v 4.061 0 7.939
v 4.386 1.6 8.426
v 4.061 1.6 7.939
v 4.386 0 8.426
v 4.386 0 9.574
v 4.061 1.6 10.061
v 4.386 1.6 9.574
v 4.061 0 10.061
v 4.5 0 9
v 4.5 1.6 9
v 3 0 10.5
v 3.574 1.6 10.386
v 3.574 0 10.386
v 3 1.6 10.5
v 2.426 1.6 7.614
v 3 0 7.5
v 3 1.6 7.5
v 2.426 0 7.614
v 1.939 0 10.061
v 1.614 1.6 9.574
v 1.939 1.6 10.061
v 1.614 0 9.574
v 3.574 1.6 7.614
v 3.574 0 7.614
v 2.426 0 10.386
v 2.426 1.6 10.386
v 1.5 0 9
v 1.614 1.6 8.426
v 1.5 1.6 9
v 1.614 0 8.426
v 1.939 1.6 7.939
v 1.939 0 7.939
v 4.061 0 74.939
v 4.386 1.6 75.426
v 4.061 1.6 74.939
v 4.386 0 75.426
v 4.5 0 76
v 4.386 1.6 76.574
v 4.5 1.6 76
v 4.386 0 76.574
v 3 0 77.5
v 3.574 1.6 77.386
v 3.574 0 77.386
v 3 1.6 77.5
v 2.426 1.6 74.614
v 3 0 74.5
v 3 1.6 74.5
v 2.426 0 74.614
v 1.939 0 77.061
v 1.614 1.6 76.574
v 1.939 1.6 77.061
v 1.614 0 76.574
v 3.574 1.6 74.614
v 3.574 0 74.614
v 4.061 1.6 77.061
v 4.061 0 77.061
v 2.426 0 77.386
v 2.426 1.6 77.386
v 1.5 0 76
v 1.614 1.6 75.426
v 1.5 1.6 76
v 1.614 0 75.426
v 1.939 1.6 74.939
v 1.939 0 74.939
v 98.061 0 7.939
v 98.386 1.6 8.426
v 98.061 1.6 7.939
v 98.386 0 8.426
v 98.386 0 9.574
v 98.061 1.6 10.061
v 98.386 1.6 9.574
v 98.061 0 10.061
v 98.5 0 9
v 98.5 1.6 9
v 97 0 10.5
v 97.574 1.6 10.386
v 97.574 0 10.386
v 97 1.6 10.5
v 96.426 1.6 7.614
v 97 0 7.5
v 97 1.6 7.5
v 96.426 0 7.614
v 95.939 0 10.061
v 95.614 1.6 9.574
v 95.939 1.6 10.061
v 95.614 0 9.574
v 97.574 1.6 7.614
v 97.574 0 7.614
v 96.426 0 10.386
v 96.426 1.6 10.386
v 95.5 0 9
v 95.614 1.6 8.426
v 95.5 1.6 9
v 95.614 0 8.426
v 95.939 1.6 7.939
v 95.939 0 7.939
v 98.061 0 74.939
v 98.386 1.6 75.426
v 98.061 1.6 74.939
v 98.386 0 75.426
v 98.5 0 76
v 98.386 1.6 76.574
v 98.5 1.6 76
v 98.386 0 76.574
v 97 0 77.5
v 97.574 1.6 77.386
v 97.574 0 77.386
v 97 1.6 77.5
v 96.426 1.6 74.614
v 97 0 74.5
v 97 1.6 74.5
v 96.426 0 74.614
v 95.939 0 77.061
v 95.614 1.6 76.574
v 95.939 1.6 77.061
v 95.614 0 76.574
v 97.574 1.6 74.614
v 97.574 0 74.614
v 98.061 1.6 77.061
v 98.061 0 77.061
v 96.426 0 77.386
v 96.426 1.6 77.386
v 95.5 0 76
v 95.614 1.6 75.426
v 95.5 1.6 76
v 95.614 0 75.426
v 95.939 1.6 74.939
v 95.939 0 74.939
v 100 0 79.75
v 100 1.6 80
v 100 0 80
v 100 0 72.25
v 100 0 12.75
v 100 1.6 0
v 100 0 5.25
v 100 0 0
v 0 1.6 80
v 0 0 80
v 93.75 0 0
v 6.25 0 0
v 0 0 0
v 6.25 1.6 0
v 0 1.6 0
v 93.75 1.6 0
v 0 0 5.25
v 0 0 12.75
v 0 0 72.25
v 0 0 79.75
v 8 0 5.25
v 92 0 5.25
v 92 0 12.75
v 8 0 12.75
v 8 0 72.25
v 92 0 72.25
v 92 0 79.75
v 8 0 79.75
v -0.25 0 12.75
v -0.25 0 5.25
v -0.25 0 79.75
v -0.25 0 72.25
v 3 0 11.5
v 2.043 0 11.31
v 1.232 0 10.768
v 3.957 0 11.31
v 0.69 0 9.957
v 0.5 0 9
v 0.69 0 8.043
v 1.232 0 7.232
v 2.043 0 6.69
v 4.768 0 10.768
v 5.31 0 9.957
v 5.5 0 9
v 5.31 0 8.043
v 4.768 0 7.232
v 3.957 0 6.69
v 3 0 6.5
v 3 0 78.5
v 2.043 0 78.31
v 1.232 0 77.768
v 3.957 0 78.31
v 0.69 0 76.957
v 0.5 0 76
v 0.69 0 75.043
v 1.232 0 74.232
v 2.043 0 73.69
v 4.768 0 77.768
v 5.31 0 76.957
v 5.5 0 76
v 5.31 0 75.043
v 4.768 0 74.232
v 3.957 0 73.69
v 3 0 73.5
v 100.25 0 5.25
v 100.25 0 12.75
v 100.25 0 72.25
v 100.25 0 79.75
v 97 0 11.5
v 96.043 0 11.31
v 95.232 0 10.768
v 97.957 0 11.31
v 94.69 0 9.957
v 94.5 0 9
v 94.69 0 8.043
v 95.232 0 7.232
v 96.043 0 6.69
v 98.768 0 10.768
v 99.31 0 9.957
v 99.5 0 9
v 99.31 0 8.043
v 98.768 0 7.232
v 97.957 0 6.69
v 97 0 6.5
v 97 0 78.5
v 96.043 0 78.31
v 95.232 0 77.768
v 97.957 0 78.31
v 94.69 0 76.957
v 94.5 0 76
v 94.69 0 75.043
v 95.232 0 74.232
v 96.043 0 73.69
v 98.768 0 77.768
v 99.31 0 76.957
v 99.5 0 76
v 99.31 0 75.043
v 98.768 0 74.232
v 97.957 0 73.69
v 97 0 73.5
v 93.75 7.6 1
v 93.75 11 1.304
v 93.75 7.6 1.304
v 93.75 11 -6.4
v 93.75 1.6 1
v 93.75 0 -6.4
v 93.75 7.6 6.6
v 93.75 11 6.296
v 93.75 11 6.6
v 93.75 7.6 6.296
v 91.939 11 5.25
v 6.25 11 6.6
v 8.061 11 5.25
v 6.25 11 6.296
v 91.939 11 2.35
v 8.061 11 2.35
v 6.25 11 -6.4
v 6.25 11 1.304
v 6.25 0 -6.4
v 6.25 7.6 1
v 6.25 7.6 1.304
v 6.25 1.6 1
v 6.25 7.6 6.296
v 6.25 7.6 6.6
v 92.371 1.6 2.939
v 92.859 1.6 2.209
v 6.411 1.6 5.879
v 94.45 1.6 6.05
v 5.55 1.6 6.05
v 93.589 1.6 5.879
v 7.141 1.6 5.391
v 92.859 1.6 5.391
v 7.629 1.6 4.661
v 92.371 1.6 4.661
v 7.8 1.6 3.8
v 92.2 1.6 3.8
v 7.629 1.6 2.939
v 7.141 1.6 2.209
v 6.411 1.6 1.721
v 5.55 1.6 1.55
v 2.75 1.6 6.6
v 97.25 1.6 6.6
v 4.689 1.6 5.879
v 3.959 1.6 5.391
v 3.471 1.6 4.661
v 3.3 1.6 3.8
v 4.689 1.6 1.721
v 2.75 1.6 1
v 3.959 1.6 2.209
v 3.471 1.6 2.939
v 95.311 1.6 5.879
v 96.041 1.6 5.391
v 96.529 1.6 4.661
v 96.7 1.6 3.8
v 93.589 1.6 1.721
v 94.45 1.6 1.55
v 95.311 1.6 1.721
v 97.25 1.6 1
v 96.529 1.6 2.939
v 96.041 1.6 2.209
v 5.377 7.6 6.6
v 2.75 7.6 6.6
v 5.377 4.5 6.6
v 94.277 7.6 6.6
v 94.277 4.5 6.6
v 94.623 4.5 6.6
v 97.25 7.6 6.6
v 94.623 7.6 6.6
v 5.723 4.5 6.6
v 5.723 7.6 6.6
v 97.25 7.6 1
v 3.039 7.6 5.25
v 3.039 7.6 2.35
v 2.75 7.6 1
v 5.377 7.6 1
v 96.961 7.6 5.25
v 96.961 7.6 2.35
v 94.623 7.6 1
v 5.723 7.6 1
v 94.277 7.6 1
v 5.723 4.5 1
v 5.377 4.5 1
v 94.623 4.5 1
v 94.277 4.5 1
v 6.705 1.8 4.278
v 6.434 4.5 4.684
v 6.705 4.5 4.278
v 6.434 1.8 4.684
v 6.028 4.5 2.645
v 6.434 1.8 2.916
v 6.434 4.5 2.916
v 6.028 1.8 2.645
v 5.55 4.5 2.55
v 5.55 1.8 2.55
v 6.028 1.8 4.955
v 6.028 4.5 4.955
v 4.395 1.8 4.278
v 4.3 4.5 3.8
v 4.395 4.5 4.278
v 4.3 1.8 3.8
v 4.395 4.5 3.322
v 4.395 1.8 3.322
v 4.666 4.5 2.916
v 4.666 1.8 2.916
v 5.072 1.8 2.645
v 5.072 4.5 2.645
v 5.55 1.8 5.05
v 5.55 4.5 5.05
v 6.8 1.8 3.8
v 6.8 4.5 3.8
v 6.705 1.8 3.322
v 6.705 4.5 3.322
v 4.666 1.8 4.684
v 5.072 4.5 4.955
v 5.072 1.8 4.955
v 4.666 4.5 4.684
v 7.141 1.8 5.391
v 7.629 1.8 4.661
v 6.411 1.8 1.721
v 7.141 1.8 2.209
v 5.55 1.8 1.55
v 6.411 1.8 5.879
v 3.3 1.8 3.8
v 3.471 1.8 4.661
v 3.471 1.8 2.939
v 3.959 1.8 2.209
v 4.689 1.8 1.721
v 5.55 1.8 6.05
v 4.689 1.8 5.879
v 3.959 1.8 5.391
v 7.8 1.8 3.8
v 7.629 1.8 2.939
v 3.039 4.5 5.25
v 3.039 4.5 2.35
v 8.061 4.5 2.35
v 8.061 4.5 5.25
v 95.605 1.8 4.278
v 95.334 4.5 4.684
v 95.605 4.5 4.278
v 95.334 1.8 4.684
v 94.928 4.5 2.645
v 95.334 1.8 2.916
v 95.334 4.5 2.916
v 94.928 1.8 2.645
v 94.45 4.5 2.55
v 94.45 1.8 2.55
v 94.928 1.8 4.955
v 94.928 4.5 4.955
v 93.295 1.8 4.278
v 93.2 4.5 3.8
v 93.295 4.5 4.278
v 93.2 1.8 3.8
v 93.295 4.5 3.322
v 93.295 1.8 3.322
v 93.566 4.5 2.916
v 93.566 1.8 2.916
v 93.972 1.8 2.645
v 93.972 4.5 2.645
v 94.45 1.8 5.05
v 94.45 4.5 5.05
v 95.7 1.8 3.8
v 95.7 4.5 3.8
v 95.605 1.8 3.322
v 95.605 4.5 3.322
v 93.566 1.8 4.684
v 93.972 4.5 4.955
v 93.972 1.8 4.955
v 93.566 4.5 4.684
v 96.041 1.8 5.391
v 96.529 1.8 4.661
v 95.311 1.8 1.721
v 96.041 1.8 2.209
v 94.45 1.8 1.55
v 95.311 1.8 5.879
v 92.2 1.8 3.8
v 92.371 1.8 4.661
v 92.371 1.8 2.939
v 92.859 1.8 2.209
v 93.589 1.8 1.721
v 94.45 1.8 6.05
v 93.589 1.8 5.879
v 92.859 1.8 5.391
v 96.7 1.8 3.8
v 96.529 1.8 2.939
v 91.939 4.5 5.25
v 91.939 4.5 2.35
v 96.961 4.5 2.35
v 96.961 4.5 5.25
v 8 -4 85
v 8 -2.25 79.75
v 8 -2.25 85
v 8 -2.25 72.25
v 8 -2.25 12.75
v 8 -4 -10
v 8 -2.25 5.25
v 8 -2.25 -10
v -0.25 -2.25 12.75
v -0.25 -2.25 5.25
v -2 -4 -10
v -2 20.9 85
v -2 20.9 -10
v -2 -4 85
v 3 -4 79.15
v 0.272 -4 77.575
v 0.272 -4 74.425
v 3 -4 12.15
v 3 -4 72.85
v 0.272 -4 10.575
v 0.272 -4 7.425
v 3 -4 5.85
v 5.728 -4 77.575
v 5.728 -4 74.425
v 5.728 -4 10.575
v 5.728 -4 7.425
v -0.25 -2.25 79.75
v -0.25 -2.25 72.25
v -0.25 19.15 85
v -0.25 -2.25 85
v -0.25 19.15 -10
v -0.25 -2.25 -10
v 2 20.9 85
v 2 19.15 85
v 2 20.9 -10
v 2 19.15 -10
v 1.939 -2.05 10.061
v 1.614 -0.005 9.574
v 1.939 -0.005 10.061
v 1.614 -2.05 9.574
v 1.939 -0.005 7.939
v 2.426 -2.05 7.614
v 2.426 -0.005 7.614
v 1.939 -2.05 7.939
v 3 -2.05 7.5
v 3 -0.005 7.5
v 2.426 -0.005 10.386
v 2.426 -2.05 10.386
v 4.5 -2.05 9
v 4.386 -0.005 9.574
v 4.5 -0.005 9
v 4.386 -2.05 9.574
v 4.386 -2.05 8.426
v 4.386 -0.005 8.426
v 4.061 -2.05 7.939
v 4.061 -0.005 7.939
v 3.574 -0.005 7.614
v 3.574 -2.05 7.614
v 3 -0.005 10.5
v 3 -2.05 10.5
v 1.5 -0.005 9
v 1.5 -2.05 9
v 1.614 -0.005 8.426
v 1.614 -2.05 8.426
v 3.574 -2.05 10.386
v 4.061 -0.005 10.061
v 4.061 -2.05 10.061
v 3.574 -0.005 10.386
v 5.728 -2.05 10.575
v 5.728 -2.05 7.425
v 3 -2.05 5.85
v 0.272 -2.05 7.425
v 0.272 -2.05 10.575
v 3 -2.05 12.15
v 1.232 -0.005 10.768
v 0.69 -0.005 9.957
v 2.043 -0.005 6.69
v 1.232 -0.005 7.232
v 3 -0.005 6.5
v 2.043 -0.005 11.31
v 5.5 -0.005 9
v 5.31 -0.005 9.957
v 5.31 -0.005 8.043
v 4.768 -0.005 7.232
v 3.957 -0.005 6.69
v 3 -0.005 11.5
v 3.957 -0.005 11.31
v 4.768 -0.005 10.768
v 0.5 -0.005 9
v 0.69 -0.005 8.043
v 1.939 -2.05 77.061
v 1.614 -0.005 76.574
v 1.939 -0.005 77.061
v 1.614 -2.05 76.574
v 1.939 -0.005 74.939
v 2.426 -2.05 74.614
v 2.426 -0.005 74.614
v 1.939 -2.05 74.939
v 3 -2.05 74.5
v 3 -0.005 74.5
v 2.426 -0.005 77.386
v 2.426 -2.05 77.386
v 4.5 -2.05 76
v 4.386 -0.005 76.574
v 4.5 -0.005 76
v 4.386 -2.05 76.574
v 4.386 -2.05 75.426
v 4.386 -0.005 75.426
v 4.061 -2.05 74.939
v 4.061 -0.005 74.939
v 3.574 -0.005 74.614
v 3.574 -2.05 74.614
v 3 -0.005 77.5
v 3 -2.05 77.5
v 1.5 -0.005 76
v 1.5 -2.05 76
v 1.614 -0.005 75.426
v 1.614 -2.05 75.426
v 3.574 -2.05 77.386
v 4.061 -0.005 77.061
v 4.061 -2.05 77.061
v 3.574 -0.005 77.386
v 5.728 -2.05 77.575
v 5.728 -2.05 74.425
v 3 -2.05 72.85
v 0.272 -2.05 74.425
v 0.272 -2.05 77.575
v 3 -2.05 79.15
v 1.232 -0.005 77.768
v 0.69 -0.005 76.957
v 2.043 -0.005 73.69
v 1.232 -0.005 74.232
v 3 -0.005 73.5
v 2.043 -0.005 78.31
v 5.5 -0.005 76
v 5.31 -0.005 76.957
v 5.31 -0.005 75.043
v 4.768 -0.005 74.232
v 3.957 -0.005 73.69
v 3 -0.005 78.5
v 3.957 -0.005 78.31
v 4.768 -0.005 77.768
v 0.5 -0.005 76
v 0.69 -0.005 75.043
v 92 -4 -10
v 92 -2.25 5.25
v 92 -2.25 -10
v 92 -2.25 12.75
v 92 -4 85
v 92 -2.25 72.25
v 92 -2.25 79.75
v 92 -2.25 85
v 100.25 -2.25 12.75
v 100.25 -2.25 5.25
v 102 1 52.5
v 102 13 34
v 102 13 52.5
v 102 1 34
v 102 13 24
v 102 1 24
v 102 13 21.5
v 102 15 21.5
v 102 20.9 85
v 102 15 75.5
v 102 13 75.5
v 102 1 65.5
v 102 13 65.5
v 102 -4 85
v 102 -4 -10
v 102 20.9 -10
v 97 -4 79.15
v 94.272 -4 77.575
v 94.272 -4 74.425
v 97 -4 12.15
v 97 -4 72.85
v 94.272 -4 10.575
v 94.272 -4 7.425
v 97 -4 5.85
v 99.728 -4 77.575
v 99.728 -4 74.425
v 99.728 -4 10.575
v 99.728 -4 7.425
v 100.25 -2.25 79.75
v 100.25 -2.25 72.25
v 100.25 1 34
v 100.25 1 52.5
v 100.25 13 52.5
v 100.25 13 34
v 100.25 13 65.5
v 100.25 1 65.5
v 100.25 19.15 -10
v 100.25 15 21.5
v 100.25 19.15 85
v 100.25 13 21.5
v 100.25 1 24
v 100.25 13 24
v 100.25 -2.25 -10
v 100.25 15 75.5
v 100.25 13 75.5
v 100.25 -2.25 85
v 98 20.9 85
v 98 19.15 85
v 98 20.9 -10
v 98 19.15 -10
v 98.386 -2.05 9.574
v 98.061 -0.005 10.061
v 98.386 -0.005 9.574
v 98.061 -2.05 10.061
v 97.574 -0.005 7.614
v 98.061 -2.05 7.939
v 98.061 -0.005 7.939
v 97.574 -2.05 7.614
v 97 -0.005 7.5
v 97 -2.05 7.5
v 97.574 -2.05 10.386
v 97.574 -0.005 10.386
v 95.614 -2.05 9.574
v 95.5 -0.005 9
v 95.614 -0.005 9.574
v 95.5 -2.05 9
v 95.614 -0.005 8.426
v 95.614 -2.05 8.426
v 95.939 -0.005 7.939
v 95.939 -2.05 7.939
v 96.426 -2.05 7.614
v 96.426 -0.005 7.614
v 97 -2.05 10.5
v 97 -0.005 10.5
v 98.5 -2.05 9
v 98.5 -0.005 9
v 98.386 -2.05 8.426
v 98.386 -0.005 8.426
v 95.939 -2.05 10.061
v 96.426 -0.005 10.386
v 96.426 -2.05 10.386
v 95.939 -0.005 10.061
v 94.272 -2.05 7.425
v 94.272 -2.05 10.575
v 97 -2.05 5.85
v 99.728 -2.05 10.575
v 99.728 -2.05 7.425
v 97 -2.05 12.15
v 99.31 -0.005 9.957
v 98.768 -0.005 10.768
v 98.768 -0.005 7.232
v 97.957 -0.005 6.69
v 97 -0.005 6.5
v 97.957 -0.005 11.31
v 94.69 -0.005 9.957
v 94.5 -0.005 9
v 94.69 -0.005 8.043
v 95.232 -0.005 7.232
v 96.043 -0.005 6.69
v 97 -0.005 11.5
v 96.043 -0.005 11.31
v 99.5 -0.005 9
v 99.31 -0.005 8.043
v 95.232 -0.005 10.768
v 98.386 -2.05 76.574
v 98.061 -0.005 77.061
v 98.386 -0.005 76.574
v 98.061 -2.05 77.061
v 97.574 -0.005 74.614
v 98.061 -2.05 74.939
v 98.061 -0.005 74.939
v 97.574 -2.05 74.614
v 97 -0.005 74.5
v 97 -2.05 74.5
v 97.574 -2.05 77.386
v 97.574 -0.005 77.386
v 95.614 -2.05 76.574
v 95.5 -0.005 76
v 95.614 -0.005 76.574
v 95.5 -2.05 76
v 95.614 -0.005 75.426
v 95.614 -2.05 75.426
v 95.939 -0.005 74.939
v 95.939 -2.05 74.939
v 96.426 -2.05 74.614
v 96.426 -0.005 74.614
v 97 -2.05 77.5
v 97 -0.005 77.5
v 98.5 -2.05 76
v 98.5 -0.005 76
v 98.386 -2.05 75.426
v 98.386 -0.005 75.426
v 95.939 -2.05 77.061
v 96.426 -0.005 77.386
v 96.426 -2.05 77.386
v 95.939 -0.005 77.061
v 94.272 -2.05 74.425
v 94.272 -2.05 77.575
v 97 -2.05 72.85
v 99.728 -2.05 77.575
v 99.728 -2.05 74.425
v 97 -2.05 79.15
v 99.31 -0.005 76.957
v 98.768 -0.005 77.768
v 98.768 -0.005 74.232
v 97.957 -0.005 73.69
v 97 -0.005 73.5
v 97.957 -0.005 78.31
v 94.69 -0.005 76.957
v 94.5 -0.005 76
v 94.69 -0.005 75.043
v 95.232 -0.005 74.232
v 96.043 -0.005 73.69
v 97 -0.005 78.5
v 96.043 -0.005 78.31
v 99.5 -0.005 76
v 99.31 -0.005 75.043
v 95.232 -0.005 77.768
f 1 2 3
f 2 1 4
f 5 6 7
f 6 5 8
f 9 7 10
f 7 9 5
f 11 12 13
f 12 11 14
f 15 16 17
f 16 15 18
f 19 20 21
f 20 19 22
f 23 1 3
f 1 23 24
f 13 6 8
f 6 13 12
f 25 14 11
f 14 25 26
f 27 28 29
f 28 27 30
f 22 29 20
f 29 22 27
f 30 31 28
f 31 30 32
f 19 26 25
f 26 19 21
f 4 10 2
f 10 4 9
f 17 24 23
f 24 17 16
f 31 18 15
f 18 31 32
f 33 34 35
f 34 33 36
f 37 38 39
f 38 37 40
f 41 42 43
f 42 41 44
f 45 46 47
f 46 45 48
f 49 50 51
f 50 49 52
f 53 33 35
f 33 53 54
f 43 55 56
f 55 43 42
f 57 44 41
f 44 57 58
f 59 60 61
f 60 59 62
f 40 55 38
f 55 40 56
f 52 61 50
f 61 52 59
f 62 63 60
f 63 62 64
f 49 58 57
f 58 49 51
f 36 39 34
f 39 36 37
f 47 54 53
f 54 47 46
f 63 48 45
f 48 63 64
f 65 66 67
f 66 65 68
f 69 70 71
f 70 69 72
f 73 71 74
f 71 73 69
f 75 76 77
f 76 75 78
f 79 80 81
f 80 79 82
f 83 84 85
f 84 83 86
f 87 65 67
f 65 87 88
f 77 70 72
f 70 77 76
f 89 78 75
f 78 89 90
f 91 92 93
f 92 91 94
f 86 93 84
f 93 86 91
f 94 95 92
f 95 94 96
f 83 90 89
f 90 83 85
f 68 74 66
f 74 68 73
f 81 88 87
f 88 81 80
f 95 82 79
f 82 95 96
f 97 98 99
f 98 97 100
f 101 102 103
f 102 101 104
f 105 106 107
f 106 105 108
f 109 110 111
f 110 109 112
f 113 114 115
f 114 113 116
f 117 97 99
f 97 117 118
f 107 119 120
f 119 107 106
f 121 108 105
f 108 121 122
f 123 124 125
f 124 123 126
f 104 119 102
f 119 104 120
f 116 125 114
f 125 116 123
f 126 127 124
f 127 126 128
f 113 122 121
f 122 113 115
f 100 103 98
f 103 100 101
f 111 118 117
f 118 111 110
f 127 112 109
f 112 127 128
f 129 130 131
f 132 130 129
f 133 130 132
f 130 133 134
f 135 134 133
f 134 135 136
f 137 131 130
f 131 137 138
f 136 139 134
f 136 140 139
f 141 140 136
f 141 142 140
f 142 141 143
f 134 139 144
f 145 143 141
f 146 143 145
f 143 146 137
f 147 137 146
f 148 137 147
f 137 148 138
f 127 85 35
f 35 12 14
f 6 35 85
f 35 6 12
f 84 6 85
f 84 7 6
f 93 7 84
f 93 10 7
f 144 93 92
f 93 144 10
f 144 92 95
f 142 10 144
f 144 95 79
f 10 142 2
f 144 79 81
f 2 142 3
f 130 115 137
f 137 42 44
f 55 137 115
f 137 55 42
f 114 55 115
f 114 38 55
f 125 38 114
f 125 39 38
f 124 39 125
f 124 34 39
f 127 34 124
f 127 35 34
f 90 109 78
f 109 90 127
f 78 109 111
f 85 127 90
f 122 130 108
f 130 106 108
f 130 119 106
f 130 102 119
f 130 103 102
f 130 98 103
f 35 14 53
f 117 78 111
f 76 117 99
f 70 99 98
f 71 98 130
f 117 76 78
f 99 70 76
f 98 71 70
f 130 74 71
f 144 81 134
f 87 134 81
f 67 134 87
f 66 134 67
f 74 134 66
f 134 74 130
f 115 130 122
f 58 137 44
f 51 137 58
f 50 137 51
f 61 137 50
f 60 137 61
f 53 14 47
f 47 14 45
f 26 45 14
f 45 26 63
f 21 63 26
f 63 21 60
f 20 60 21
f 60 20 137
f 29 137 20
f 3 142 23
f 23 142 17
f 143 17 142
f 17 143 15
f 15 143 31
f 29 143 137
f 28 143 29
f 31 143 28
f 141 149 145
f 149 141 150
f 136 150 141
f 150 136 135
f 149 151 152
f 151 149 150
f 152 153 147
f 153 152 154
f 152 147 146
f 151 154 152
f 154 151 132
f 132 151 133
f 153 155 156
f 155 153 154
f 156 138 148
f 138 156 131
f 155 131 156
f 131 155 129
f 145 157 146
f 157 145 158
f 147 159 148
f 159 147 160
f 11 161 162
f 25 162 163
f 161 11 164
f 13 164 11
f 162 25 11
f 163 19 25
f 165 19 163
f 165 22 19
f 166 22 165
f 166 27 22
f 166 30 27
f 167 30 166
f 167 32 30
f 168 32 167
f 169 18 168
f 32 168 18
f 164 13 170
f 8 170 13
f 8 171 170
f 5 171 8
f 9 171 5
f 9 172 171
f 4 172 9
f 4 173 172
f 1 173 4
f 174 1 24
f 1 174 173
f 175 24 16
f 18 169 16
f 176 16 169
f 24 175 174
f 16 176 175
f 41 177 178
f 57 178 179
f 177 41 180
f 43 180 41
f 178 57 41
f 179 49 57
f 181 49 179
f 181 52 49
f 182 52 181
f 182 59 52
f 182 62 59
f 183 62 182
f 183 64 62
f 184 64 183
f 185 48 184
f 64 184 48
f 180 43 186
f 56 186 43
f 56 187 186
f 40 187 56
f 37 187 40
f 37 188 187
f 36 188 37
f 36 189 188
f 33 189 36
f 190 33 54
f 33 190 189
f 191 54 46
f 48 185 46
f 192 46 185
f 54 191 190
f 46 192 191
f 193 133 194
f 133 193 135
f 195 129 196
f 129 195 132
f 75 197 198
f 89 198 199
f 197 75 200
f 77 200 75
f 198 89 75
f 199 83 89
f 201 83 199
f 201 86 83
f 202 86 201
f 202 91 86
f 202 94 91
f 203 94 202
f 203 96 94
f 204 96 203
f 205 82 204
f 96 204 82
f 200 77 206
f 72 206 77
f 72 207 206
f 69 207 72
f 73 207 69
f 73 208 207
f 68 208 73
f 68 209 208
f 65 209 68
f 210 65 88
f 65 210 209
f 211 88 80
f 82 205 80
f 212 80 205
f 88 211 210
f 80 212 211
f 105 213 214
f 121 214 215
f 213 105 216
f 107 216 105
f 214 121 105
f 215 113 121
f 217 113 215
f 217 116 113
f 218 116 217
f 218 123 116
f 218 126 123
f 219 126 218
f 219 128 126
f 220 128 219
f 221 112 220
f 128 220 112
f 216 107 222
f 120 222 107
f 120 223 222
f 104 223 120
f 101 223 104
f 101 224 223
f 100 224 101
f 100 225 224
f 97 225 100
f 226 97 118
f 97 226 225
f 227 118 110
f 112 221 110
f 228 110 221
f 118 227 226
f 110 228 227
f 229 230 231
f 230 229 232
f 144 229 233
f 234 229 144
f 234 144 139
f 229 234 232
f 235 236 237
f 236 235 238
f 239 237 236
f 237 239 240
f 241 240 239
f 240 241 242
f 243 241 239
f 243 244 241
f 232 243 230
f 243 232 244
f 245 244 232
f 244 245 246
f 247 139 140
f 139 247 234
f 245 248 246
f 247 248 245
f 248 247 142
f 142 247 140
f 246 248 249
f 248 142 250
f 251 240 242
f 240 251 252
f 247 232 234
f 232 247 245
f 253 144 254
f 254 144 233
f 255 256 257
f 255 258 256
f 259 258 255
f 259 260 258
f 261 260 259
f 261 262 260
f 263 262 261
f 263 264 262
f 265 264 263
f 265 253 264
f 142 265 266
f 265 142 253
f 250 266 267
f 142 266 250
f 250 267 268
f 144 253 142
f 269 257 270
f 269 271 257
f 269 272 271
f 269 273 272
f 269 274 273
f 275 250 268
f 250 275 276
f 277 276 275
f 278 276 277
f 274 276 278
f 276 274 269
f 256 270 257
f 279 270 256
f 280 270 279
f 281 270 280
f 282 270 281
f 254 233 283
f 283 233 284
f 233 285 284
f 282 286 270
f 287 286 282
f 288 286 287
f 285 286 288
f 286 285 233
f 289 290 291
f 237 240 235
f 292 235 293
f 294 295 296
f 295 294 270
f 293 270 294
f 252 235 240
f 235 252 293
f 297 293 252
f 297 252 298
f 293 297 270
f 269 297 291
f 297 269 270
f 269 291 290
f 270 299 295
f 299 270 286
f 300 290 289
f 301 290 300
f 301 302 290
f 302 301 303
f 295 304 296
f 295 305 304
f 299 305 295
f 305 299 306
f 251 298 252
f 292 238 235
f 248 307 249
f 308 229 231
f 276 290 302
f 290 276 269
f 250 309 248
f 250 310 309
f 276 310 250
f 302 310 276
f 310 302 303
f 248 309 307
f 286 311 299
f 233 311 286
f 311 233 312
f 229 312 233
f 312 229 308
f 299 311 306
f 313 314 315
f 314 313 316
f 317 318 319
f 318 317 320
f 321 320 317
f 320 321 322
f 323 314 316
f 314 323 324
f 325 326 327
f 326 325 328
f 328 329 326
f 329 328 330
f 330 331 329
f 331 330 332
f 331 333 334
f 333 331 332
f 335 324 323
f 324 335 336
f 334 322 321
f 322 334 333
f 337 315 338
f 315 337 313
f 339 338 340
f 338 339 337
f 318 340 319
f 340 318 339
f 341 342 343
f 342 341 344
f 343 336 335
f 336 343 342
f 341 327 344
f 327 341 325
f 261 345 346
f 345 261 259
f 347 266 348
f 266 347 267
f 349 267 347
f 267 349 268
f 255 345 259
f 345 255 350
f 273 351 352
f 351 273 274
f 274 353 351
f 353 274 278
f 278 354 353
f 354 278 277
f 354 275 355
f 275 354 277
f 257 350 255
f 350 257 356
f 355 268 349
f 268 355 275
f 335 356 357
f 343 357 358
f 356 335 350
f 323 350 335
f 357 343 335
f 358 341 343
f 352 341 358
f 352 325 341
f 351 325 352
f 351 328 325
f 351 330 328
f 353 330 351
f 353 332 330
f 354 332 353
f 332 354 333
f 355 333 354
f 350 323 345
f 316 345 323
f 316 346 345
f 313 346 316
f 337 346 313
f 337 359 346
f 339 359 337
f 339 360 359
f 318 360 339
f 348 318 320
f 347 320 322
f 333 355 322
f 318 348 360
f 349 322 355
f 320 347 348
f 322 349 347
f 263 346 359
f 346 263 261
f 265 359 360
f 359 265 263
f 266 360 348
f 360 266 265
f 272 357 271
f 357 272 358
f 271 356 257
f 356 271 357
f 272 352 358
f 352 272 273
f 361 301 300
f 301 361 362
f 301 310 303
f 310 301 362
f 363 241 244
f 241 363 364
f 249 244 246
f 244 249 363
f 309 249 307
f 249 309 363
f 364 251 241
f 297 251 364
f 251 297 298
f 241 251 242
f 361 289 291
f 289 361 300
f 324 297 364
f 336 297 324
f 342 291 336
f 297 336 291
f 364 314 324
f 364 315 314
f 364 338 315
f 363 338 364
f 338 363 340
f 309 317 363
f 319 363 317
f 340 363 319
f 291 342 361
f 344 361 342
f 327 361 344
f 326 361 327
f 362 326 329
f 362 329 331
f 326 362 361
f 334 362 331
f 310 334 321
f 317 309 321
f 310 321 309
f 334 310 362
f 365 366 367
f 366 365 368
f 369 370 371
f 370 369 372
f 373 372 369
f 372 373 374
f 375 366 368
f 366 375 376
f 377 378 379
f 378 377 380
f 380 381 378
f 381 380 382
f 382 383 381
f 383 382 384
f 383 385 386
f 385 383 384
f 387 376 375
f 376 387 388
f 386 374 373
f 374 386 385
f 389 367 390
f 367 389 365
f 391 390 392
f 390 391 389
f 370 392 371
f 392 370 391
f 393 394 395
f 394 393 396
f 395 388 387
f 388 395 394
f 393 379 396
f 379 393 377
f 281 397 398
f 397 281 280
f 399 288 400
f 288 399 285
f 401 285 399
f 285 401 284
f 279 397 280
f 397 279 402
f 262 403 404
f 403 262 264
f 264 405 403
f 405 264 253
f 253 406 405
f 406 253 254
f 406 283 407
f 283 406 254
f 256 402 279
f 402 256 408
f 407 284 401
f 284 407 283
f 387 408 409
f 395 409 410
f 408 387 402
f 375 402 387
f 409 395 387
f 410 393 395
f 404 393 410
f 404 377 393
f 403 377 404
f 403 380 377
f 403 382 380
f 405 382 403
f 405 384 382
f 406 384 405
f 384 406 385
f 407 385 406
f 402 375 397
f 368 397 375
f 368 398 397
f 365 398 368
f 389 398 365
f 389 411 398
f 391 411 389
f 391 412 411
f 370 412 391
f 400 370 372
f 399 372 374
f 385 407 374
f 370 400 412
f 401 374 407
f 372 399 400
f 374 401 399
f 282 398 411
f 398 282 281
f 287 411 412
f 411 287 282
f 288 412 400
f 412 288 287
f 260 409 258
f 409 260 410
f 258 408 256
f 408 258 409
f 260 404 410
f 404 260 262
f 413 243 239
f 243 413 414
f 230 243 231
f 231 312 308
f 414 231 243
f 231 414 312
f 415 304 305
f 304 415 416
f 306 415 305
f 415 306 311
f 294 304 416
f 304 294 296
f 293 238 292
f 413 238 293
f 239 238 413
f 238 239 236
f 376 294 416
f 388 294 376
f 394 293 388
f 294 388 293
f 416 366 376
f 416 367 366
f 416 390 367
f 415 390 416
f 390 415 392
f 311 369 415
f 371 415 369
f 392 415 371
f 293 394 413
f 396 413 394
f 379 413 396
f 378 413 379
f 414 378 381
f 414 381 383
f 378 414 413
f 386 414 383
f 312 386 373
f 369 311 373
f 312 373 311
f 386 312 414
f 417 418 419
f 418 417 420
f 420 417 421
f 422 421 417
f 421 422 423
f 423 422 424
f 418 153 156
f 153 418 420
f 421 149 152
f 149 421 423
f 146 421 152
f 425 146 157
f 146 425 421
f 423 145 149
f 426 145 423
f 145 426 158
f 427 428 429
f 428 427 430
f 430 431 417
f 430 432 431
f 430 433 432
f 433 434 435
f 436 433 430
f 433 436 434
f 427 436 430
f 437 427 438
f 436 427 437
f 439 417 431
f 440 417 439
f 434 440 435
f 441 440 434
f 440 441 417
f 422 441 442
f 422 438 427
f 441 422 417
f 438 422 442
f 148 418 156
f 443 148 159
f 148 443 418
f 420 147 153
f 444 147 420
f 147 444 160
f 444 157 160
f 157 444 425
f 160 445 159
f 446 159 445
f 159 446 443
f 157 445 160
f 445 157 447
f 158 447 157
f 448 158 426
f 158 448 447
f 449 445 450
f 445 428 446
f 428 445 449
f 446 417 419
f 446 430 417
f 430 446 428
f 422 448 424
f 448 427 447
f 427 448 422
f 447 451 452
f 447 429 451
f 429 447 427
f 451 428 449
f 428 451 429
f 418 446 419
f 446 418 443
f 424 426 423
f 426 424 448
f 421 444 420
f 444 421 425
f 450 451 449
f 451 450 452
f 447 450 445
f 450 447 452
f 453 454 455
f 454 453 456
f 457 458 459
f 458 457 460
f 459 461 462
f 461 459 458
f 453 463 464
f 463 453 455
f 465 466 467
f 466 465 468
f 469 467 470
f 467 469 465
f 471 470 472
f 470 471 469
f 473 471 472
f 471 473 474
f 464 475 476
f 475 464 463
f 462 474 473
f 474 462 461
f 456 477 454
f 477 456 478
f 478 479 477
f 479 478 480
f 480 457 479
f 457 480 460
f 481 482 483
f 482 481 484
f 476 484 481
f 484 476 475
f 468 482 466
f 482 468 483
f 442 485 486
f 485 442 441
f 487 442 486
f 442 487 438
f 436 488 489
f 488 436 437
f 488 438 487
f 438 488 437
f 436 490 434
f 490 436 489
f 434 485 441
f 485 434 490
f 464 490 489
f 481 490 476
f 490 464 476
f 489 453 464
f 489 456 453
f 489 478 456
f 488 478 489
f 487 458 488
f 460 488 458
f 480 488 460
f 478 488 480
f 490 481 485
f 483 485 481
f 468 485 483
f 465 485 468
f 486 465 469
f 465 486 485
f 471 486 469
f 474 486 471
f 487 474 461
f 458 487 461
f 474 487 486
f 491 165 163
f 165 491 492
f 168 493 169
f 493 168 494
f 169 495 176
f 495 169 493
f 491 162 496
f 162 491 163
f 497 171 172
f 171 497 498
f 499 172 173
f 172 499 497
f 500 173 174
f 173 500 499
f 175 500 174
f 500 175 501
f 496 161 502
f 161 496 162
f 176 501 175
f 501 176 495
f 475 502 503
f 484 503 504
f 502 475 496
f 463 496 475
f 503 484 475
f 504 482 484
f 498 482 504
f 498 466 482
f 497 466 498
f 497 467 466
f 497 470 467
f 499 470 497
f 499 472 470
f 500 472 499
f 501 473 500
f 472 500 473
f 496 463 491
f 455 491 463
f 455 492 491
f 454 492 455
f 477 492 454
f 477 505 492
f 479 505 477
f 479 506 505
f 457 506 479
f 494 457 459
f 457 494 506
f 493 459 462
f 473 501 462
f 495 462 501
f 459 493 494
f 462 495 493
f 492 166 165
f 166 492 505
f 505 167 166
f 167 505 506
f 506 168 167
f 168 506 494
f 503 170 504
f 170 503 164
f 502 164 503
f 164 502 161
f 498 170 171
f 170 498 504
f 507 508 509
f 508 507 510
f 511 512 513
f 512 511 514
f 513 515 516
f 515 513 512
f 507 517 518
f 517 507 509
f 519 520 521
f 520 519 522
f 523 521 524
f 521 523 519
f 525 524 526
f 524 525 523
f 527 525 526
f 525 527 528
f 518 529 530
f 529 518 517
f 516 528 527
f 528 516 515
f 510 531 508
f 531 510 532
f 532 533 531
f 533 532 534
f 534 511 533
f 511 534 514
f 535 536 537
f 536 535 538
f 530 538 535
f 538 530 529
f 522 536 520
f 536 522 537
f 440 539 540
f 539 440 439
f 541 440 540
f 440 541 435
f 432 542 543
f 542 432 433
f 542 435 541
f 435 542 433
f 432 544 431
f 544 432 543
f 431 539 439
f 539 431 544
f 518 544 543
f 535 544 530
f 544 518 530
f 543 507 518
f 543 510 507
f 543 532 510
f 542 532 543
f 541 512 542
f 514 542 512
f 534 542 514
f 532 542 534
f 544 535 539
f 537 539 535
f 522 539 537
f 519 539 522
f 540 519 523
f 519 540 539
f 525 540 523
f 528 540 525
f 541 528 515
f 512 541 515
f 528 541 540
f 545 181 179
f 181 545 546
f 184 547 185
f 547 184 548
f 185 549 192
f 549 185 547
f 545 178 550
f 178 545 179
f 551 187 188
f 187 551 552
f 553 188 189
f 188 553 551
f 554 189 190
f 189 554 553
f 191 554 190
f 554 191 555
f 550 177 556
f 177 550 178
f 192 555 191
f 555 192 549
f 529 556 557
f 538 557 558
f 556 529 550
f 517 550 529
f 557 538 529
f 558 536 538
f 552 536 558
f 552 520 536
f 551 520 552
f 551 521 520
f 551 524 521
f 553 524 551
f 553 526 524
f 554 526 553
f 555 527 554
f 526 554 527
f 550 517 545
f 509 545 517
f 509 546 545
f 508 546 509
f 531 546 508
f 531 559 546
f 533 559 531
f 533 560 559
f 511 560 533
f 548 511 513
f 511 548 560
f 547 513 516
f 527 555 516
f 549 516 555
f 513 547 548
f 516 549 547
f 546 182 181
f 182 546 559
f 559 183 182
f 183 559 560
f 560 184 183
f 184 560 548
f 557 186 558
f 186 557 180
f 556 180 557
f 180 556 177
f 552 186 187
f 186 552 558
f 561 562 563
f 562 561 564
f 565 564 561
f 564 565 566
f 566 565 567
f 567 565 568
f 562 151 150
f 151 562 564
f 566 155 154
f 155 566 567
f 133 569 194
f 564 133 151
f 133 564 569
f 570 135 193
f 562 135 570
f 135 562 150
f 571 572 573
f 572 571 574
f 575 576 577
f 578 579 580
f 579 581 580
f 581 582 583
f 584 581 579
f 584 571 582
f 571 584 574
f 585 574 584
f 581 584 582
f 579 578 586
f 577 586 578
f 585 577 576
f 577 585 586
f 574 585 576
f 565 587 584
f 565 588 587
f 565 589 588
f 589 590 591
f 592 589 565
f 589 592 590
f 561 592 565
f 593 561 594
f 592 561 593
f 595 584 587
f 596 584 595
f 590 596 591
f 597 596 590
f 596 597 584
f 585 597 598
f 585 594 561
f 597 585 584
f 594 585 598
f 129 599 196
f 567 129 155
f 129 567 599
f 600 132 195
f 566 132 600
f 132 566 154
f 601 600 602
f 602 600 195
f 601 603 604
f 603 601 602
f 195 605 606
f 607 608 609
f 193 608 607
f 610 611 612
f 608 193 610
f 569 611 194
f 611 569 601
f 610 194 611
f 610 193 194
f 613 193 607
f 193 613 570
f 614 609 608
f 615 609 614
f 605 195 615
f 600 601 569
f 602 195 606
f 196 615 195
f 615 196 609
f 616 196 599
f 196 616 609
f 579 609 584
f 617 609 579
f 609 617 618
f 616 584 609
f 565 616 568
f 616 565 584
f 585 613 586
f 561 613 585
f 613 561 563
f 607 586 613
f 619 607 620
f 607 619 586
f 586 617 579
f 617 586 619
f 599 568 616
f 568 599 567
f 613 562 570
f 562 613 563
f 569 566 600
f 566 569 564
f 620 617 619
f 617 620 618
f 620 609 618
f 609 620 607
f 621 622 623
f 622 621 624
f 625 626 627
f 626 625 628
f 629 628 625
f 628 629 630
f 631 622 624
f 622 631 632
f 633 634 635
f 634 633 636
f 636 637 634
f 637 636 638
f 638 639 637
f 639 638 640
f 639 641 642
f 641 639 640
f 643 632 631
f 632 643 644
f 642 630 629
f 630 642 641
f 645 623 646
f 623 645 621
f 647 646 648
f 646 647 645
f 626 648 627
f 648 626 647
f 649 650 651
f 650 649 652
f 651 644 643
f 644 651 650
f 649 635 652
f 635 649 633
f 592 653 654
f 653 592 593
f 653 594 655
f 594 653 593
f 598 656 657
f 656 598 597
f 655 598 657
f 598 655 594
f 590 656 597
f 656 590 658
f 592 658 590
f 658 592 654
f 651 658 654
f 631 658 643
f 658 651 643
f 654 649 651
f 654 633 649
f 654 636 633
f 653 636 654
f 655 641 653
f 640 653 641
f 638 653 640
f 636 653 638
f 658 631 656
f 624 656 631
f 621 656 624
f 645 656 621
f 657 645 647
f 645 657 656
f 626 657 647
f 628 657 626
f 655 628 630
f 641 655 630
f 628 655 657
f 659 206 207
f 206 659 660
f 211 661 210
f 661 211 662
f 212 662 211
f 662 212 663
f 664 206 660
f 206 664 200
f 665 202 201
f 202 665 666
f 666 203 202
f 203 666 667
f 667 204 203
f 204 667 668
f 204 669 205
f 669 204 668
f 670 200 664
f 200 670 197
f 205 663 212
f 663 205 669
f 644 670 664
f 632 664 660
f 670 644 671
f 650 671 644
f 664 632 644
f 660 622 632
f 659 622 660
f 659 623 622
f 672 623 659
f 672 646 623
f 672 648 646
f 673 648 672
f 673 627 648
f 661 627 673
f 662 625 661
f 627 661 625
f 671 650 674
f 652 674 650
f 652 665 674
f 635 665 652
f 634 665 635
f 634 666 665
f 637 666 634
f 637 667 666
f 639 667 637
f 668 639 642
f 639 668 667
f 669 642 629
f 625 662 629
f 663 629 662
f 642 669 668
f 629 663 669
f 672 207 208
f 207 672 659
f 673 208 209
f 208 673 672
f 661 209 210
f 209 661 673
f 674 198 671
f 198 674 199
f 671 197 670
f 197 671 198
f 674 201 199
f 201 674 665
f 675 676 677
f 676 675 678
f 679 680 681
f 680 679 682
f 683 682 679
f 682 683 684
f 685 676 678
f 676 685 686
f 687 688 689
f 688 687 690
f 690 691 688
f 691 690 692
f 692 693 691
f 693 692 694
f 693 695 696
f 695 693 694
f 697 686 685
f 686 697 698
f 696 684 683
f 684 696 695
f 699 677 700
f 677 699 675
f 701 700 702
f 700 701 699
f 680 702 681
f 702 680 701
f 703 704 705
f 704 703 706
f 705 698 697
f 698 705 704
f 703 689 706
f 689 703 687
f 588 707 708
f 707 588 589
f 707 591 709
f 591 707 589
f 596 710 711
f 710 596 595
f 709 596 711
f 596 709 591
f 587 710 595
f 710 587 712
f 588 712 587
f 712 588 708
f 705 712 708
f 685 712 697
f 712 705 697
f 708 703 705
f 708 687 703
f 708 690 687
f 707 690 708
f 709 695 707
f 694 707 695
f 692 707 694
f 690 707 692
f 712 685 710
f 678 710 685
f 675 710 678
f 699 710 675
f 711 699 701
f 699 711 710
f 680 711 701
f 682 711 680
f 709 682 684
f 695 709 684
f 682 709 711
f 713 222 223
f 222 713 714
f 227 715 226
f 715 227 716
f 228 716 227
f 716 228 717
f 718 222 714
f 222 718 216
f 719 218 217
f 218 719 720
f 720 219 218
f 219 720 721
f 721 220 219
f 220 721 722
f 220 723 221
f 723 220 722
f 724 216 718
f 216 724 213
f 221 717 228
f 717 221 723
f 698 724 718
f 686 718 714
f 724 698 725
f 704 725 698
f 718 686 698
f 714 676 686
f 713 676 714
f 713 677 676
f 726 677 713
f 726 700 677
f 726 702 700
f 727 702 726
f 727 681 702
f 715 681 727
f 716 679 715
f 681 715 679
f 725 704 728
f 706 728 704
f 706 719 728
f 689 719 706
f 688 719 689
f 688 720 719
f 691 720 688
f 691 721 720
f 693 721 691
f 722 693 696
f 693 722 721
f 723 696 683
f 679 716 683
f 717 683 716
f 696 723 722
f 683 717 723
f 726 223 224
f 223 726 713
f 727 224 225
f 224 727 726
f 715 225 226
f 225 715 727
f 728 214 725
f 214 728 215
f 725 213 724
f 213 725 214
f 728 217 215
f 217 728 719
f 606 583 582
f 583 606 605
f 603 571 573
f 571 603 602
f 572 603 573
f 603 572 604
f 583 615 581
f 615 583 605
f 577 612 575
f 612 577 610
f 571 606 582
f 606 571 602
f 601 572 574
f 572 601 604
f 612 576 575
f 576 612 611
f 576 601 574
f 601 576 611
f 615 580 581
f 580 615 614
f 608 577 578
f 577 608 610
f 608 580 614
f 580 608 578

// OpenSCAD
// file: ../library/din41612/din41612_male.scad
// din41612 male connector
// =======================

include <din41612_male_dim.scad>

use <../linurs/linurs_screw.scad>

module din41612_male(){ 
  // color("LightGrey")
  difference(){
    union(){
        translate([0,din41612_male_w1/2,din41612_male_h/2-din41612_male_h1])  
        cube([din41612_male_l1,
              din41612_male_w1,
              din41612_male_h],
             center=true);  
      translate([0,(din41612_male_w1-din41612_male_w)/2,(din41612_male_h-din41612_male_h1)/2]) 
        cube([din41612_male_l1,
              (din41612_male_w-din41612_male_w1),
              din41612_male_h-din41612_male_h1],
             center=true);  
      translate([0,din41612_male_w2/2+din41612_male_w1-din41612_male_w,din41612_male_h2/2])
        cube([din41612_male_l,
              din41612_male_w2,
              din41612_male_h2],
             center=true);  
    }
    for(i=[-1,1]){ // mounting holes
      translate([i*din41612_male_dl/2,
                 din41612_male_w1-din41612_male_w+din41612_male_w2/2, 
                 din41612_male_h1])
      rotate([180,0,90])screw_fix(
            w=din41612_male_h2, 
            d=M2_5, 
            type=head_cyl, 
            nut_sink=din41612_male_h,
            t=0);
    }
  }
}
din41612_male();  
// file: ../library/din41612/din41612_male_dim.scad
include <../linurs/linurs_screw_dim.scad>

// connector dimensions
din41612_male_l=94.5;    // lenght of the connector
din41612_male_l1=87.5;   // 
din41612_male_w=13;      // width of the connector
din41612_male_w1=6.4;    // 
din41612_male_w2=5.6;    // 
din41612_male_h=11;      // height of the connector
din41612_male_h1=1.6;    // 
din41612_male_h2=6;      // 

din41612_male_dl=88.9;   // distance between mounting holes
// file: ../library/din41612/din41612_female_dim.scad
include <../linurs/linurs_screw_dim.scad>

// connector dimensions
din41612_female_l=95;       // lenght of the connector
din41612_female_l1=85;      // lenght of the connector head
din41612_female_h=11.6;     // height of the connector
din41612_female_h1=5.2;     // height produced by the connector when pulgged in 
din41612_female_w=11;       // width of the connector
din41612_female_w1=8.5;     // width of the connector head

din41612_female_dl=90;      // distance between mounting holes
// file: ../pcb/pcb.scad
// pcb
// ===
// The pcb is the master object and has its 
// lower left corner solder side at the origin of the 
// coordinate system 

n=2;  // [1,2,3,4,5,6,7,8]
show_pcb="assemblies"; // [assemblies,assembly,pcb]

include <pcb_dim.scad>
include <../motherboard/motherboard_dim.scad>

use <../library/din41612/din41612_male.scad>

module pcb(){
  echo("pcb");  
  color("greenyellow")
  difference(){
    cube([pcb_l,pcb_h,pcb_w]); // pcb
    for(x=[-1,1]){ // mounting holes
      for(y=[pcb_wd1,pcb_wd1+pcb_wd]){
        translate([x*pcb_ld/2+pcb_l/2,0,y])
        rotate([90,0,0])
        cylinder(d=pcb_d,h=3*pcb_h,center=true,$fn=16);
      }
    }
  }
}

module pcb_assembly(){
  echo("pcb assembly");  
  pcb();  
  translate([pcb_l/2,pcb_h,0])  
  rotate([-90,0,0])din41612_male();  
}

module pcb_assemblies(n=1){
  echo("pcb assemblies"); 
  for(i=[0:n-1]){ // add the connectors
      echo(i);
      translate([0,step*i,0])
      pcb_assembly();
  }    
}    

if(show_pcb=="assemblies"){
  pcb_assemblies(n=n);
}

if(show_pcb=="assembly"){
  pcb_assembly();
}

if(show_pcb=="pcb"){
    // Move to center to create 2D drawings from top view 
    // with script OpenSCAD22d.py
    //
    rotate([90,0,180])
    //
    translate([-pcb_l/2,-pcb_h/2,-pcb_w/2])
    pcb();
}
// file: ../bracket/bracket.scad
// bracket
// =======
// A bracket of the elecbox module
// - type: 0 front bracket, 1 rear bracket
// - width 1..n in steps

// parameters for customizer
// bracket width
n=2; // [1,2,3,4,5,6,7,8]
// type
bracket="Front"; // [Front,Back]
// intermediate mounting holes
intermediate=false;  

include <../pcb/pcb_dim.scad>

include <../motherboard/motherboard_dim.scad>
include <../library/linurs/linurs_screw_dim.scad>
include <bracket_dim.scad>

use <../library/linurs/linurs_screw.scad>
    
module back_bracket(n=1, intermediate=false){
  mirror([1,0,0])       // mirror it if desired
  front_bracket(n=n, intermediate=intermediate); 
}
    
module front_bracket(n=1, intermediate=false){
  echo("bracket");  
  //color("White")
  intermediatestep=(intermediate)?step:0; 
  difference(){
    union(){
      translate([-bracket_h2/2-bracket_gap/2,
                 bracket_w(n)/2-bracket_w1,
                 bracket_l/2])  
      cube([bracket_h2,
            bracket_w(n),
            bracket_l],center=true); // create the bracket front
  
      translate([bracket_h/2-bracket_h2-bracket_gap/2,
                 bracket_t/2-bracket_w1,
                 bracket_l/2]) 
      cube([bracket_h,
            bracket_t,
            bracket_l],center=true); // U shape side of the screw
      
      translate([bracket_h1/2-bracket_h2-bracket_gap/2,
                 bracket_w(n)-bracket_w1-bracket_t/2,
                 bracket_l/2]) 
      cube([bracket_h1,
            bracket_t,
            bracket_l],center=true); // U shape where no screw  
      for(x=[1:n]){  // create the mounting hole cubes 
        for(z=[bracket_l1,
               bracket_l1+bracket_ld]){
          translate([ bracket_h/2-bracket_h2-bracket_gap/2,
                     -bracket_w1/2+(x-1)*intermediatestep,
                     z])
          cube([bracket_h,
                bracket_w1,
                bracket_l2],center=true);
        }
      }   
    }
    for(x=[1:n]){ // create the mounting hole 
      for(z=[bracket_l1,
             bracket_l1+bracket_ld]){
        translate([bracket_h3-bracket_h2-bracket_gap/2,
                  -bracket_w1/2+(x-1)*intermediatestep,
                   z])
        rotate([0,90,0])
        rotate([-90,0,0])
        screw_fix(w=bracket_w1,d=bracket_screw,type=head_no, t=bracket_screw_gap);
      }
    }
  }
}

if(bracket=="Front"){
  front_bracket(intermediate=intermediate,n=n);
}

if(bracket=="Back"){
  back_bracket(intermediate=intermediate,n=n);
}
// file: ../library/linurs/linurs_screw.scad
// Metric screws and nuts 
// urs@linurs.org 2019
// It is targeted for 3D printing applications. 
// To look realistic is not the goal (Example: Nuts do not have a hole)

include <linurs_screw_dim.scad>

d=0; //[0:M2_5,1:M3,2:M4,3:M5]
type=0;//[0:head_cyl,1:head_cnt,2:head_no,3:head_hex]
w=15; 
i=10;
nut_sink=0;
screw_sink=0; 
t=0.01;
fn=16;

/* [hex_bolt] */
show_hex_bolt=false;

/* [nut] */
show_nut=false;

/* [screw] */
show_screw=false;

/* [screw_fix] */
show_screw_fix=false;

/* [screw_cut] */
show_screw_cut=false;

/* [nut_cut] */
show_nut_cut=false;
wi=0; 
rot=false;

// functions used multiple times to position nuts and heads
function headh_cyl(d)=screw_cyl[d][1];  // height of cyl screw head
function headh_cnt(d)=screw_cyl[d][1];  // height of cnt screw head
function headh(d,type=head_cyl)=(type==head_cyl ? headh_cyl(d) : (type==head_cnt ? headh_cnt(d) : 0 )); // height of screw head 

function nuth(d)=screw_hex[d][2];   // height of hex nut

// head of a cylinder screw
module screw_head_cyl(d=M3, t=0)
{
  screwhd=screw_cyl[d][0]+t; // diameter of cylinder screw head
  cylinder(d=screwhd,h=headh(d=d, type=head_cyl), center=true,$fn=16); // screw head
}

// head of a countersunk screw
module screw_head_cnt(d=M3, t=0)
{
  screwd=screw_d[d]+t; 
  screwhd=screw_cnt[d][0]+t; // diameter of cylinder screw head
  cylinder(d1=screwd,d2=screwhd,h=headh(d=d,type=head_cnt), center=true,$fn=16); // screw head
}

// head of a hex screw
module screw_head_hex(d=M3, t=0)
{
    translate([0,0,-nuth(d)/2])nut(d=d, t=t);
}

// head of all screws
module screw_head(d=M3, type=head_cyl, t=0)
{ 
  if(type==head_cnt){
    screw_head_cnt(d=d, t=t);
  } else {
    if(type==head_cyl){
      screw_head_cyl(d=d, t=t);
    } else {
       if(type==head_hex){
           screw_head_hex(d=d, t=t); 
       } 
    }    
  }
}

// hex bolt 
module hex_bolt(d=M3, w=10, t=0)
{
  nutd=screw_hex[d][1]+t; // outer diameter of hex bolt
  cylinder(r=nutd/2,h=w+t, center=true,$fn=6); // nut
}

// nut 
module nut(d=M3, t=0)
{
  hex_bolt(d=d, w=nuth(d), t=t);    
}

// screw 
// w outer width of the screw = screw length + head 
module screw(w=10, d=M3, type=head_cyl, t=0){
  screwd=screw_d[d]+t;       // screw diameter
  cylinder(d=screwd, h=w, center=true,$fn=16); // screw thread length
  translate([0,0,w/2-headh(d=d,type=type)/2])
  screw_head(d=d,type=type, t=t);
}

// screw fix
// w outer width of the screw = screw length + head 
// sink additional material below to remove 
// raise additional material above to remove
module screw_fix(w=10, d=M3, type=head_cyl, screw_sink=0, nut_sink=0, t=0){
  screw(w=w, d=d, type=type, t=t);
  translate([0,0,-w/2+nuth(d)/2])
    nut(d=d,t=t);
  //additional material to be removed above the nut  
  translate([0,0,-(w+nut_sink)/2])hex_bolt(d=d,w=nut_sink+0.01,t=t);    
  //additional material to be removed above the screw head
  if(type==head_cnt){  
    translate([0,0,w/2+screw_sink])
    cylinder(d=screw_cnt[d][0]+t,h=screw_sink+0.01,center=true,$fn=16);
  }else{ 
    translate([0,0,(w+screw_sink)/2])
    cylinder(d=screw_cyl[d][0]+t,h=screw_sink+0.01,center=true,$fn=16);
  }     
}

// screw cut
// material to be extracted from object to slide in a counter sunk screw for fixation
// w height of the cut out
// i depth of the screw
module screw_cut(d=M3,w=20,i=10,t=0,fn=32){
    hsh=screw_cnt[d][1];
    ws=screw_cnt[d][0]+t;
    ds=screw_d[d]+t;
    
    translate([i/2,0,-(w-hsh)/2])
      cube([i,ws,hsh],center=true);
    
    translate([0,0,-(w-hsh)/2])
      cylinder(d=ws,h=hsh,center=true,$fn=32);
    
    translate([0,0,-(w-hsh)/2+hsh])
        cylinder(d2=ds, d1=ws, h=hsh,center=true,$fn=fn);
    
    cylinder(h=w, d=ds, center=true, $fn=fn);   
    
    translate([i/2,0,0]) 
        cube([i,ds,w],center=true);
    
    for(y=[-1,1]){
        translate([i/2,y*ds/2,-w/2+hsh])
            rotate([45,0,0])
            cube([i,sqrt(2)*(ws-ds)/2,sqrt(2)*(ws-ds)/2],center=true);
    }
}
//screw_cut();

// nut cut
// material to be extracted from object to slide in a nut for fixation
// w height of the cylinder
// i lenght of the inlet
module nut_cut(w=10, wi=0, d=M3, i=10, t=0, rot=false,type=head_cyl){ 
  r=(rot)?90:0;
  ds=(rot)?screw_hex[d][1]:screw_hex[d][0];
  rotate([0,0,r])nut(d,t);
  translate([i/2,0,0])
    cube([i,ds+t,nuth(d)+t],center=true);
  translate([0,0,-wi])
      if(type==head_cnt){    
          screw(w=w, d=d, type=type, t=t); 
        translate([0,0,w/2])
          cylinder(d=screw_cnt[d][0]+t,h=raise,center=true,$fn=16);
      }
      else{ 
          screw(w=w, d=d, type=type, t=t);   
  //      translate([0,0,0])
          //#cylinder(d=screw_cyl[d][0]+t,h=w,center=true,$fn=16);
      }       
}

if(show_hex_bolt==true){
   hex_bolt(d=d, w=w, t=t);
}

if(show_nut==true){
  nut(d=d, t=t);
}    

if(show_screw==true){
   screw(w=w, d=d, type=type, t=t);
}

if(show_screw_fix==true){
  screw_fix(w=w, d=d, type=type, nut_sink=nut_sink, screw_sink=screw_sink, t=t);
}

if(show_screw_cut==true){
  screw_cut(d=d,w=w,i=i,t=t,$fn=fn);
}    

if(show_nut_cut==true){
  nut_cut(w=w, wi=wi, d=d, i=i, t=t,rot=rot,type=type);
}  
// file: ../library/linurs/linurs_screw_dim.scad
// Metric screws and nuts 
// urs@linurs.org

// contains dimensions of linurs_screw and can be included in other 
// OpenScad files 

// Parameters in this file
// d screw diameter M2_5, M3, ... (enumeration with screw_d)
// t millimeters added to diameters 

// enumerations of metric threads
M2_5=0;
M3=1;
M4=2;
M5=3;

// enumerations screw head type
head_cyl=0; // cylinder
head_cnt=1; // countrsunk
head_no=2;  // no head at all
head_hex=3;  // no head at all

// screw diameters
screw_d=[
2.5, // M2.5
3.0, // M3
4.0, // M4
5.0  // M5
];

// sizes for hex nuts
screw_hex=[
//   s,   e,   h
 [ 5.0, 5.8, 1.7], // M2.5
 [ 5.5, 6.4, 2.0], // M3
 [ 7.0, 8.1, 2.8], // M4
 [ 8.0, 9.2, 3.5]  // M5
];

// sizes for cylinder screw heads
screw_cyl=[
//   d,   h
 [ 4.5, 1.6], // M2.5
 [ 5.5, 2.0], // M3
 [ 7.0, 2.6], // M4
 [ 8.5, 3.3]  // M5
];

// sizes for countersunk screw heads
screw_cnt=[
//   d,   h
 [ 4.7, 1.50], // M2.5
 [ 5.6, 1.65], // M3
 [ 7.4, 2.20], // M4
 [ 9.2, 2.50]  // M5
];
// file: ../motherboard/motherboard_dim.scad
include <../library/linurs/linurs_screw_dim.scad>
include <../library/din41612/din41612_female_dim.scad>
include <../library/din41612/din41612_male_dim.scad>
include <../pcb/pcb_dim.scad>
// motherboard pcb dimensions
motherboard_l=pcb_l;   // pcb width
motherboard_h=1.6;     // pcb thickness
step=25.4;             // distance between modules

function motherboard_w(n)=din41612_female_w+step*(n-1);

screw_motherboard_d=M2_5;
screw_motherboard_l=16;
motherboard_pass=0.5;// gap to fit screws 

motherboard_z_offset=-din41612_male_w1-din41612_female_h1-motherboard_h;
// file: ../bracket/bracket_dim.scad
// bracket

include <../pcb/pcb_dim.scad>
include <../motherboard/motherboard_dim.scad>
include <../library/linurs/linurs_screw_dim.scad>

bracket_screw=M2_5;   // hole for the screw

bracket_gap=0.5;      // gap between bracket to make sure it fits in the box
bracket_screw_gap=0.5;// gap to fit the screw

bracket_l=pcb_w+15;   // height of bracket
bracket_l1=19;        // hole l
bracket_l2=3*screw_d[bracket_screw];
bracket_ld=pcb_wd;    // hole distance

bracket_h=10;         // depth of the U shape at the side of the screw
bracket_h1=4;         // depth of the U shape at the side where no screw is 
bracket_h2=2-bracket_gap/2;   // thickness of bracket
bracket_h3=5;         // hole h

bracket_w1=4;         // height of the mounting hole cube
bracket_tn=2;         // thickness of bracket
bracket_t=bracket_tn-bracket_gap/2;  // thickness of bracket - gap

bracket_offset_z=-10;  // bracket offset in elecbox z axis

function bracket_w(n)=step*n-bracket_gap;
function bracket_w2(n)=step*n-2*bracket_tn;
// file: ../pcb/pcb_dim.scad
// The pcb is the master object of the project
// therefore no other include files from other objects
// are necessary

// pcb constants
pcb_l =100;  // lenght of the pcb
pcb_ld = 94; // hole distance 
pcb_w=80;    // height of the pcb
pcb_wd = 67; // hole distance
pcb_wd1 = 9; // hole to edge distance 
pcb_d=3;     // diameter of holes
pcb_h=1.6;   // thickness
// main file
// ArduinoMegaMega module
// ==============

ArduinoMega="assembly"; // [assembly,front,back,print_front,print_back]

include <../pcb/pcb_dim.scad>
include <../bracket/bracket_dim.scad>
include <../motherboard/motherboard_dim.scad>
include <../library/linurs/linurs_screw_dim.scad>

use <../library/linurs/linurs_screw.scad>
use <../bracket/bracket.scad>
use <../pcb/pcb.scad>

module ArduinoMega_back(){
    a1=1;
    
    h1=12;
    w1=13;
    z1=52.5;
   
    h2=12;
    w2=10;
    z2=24;
    
    a2=12;
    
    h3=2;
    w3=54;
    z3=21.5;
    
    difference(){
        
        translate([0,0,bracket_offset_z])back_bracket(n=1);
        
        translate([
          0,
          a1+h1/2,
          z1+w1/2])
        cube([
          bracket_h,
          h1,
          w1],center=true);
        
        translate([
          0,
          a1+h2/2,
          z2+w2/2])
        cube([
          bracket_h,
          h2,
          w2],center=true);
        
        // ArduinoMegaMega pcb cut out
        translate([
          0,
          a1+a2+h3/2,
          z3+w3/2])
        cube([
          bracket_h,
          h3,
          w3],center=true);
    }
}

module ArduinoMega_front(){
    translate([0,0,bracket_offset_z])front_bracket(n=1);
}

module ArduinoMega_assembly(){
    pcb_assembly();
    ArduinoMega_front();
    translate([pcb_l,0,0])ArduinoMega_back();
}

if(ArduinoMega=="assembly"){
  ArduinoMega_assembly();
}

if(ArduinoMega=="front"){
  ArduinoMega_front();
}

if(ArduinoMega=="back"){
  ArduinoMega_back();
}

if(ArduinoMega=="print_front"){
  rotate([0,-90,0])
    ArduinoMega_front();
}

if(ArduinoMega=="print_back"){
  rotate([0,90,0])ArduinoMega_back();
}
